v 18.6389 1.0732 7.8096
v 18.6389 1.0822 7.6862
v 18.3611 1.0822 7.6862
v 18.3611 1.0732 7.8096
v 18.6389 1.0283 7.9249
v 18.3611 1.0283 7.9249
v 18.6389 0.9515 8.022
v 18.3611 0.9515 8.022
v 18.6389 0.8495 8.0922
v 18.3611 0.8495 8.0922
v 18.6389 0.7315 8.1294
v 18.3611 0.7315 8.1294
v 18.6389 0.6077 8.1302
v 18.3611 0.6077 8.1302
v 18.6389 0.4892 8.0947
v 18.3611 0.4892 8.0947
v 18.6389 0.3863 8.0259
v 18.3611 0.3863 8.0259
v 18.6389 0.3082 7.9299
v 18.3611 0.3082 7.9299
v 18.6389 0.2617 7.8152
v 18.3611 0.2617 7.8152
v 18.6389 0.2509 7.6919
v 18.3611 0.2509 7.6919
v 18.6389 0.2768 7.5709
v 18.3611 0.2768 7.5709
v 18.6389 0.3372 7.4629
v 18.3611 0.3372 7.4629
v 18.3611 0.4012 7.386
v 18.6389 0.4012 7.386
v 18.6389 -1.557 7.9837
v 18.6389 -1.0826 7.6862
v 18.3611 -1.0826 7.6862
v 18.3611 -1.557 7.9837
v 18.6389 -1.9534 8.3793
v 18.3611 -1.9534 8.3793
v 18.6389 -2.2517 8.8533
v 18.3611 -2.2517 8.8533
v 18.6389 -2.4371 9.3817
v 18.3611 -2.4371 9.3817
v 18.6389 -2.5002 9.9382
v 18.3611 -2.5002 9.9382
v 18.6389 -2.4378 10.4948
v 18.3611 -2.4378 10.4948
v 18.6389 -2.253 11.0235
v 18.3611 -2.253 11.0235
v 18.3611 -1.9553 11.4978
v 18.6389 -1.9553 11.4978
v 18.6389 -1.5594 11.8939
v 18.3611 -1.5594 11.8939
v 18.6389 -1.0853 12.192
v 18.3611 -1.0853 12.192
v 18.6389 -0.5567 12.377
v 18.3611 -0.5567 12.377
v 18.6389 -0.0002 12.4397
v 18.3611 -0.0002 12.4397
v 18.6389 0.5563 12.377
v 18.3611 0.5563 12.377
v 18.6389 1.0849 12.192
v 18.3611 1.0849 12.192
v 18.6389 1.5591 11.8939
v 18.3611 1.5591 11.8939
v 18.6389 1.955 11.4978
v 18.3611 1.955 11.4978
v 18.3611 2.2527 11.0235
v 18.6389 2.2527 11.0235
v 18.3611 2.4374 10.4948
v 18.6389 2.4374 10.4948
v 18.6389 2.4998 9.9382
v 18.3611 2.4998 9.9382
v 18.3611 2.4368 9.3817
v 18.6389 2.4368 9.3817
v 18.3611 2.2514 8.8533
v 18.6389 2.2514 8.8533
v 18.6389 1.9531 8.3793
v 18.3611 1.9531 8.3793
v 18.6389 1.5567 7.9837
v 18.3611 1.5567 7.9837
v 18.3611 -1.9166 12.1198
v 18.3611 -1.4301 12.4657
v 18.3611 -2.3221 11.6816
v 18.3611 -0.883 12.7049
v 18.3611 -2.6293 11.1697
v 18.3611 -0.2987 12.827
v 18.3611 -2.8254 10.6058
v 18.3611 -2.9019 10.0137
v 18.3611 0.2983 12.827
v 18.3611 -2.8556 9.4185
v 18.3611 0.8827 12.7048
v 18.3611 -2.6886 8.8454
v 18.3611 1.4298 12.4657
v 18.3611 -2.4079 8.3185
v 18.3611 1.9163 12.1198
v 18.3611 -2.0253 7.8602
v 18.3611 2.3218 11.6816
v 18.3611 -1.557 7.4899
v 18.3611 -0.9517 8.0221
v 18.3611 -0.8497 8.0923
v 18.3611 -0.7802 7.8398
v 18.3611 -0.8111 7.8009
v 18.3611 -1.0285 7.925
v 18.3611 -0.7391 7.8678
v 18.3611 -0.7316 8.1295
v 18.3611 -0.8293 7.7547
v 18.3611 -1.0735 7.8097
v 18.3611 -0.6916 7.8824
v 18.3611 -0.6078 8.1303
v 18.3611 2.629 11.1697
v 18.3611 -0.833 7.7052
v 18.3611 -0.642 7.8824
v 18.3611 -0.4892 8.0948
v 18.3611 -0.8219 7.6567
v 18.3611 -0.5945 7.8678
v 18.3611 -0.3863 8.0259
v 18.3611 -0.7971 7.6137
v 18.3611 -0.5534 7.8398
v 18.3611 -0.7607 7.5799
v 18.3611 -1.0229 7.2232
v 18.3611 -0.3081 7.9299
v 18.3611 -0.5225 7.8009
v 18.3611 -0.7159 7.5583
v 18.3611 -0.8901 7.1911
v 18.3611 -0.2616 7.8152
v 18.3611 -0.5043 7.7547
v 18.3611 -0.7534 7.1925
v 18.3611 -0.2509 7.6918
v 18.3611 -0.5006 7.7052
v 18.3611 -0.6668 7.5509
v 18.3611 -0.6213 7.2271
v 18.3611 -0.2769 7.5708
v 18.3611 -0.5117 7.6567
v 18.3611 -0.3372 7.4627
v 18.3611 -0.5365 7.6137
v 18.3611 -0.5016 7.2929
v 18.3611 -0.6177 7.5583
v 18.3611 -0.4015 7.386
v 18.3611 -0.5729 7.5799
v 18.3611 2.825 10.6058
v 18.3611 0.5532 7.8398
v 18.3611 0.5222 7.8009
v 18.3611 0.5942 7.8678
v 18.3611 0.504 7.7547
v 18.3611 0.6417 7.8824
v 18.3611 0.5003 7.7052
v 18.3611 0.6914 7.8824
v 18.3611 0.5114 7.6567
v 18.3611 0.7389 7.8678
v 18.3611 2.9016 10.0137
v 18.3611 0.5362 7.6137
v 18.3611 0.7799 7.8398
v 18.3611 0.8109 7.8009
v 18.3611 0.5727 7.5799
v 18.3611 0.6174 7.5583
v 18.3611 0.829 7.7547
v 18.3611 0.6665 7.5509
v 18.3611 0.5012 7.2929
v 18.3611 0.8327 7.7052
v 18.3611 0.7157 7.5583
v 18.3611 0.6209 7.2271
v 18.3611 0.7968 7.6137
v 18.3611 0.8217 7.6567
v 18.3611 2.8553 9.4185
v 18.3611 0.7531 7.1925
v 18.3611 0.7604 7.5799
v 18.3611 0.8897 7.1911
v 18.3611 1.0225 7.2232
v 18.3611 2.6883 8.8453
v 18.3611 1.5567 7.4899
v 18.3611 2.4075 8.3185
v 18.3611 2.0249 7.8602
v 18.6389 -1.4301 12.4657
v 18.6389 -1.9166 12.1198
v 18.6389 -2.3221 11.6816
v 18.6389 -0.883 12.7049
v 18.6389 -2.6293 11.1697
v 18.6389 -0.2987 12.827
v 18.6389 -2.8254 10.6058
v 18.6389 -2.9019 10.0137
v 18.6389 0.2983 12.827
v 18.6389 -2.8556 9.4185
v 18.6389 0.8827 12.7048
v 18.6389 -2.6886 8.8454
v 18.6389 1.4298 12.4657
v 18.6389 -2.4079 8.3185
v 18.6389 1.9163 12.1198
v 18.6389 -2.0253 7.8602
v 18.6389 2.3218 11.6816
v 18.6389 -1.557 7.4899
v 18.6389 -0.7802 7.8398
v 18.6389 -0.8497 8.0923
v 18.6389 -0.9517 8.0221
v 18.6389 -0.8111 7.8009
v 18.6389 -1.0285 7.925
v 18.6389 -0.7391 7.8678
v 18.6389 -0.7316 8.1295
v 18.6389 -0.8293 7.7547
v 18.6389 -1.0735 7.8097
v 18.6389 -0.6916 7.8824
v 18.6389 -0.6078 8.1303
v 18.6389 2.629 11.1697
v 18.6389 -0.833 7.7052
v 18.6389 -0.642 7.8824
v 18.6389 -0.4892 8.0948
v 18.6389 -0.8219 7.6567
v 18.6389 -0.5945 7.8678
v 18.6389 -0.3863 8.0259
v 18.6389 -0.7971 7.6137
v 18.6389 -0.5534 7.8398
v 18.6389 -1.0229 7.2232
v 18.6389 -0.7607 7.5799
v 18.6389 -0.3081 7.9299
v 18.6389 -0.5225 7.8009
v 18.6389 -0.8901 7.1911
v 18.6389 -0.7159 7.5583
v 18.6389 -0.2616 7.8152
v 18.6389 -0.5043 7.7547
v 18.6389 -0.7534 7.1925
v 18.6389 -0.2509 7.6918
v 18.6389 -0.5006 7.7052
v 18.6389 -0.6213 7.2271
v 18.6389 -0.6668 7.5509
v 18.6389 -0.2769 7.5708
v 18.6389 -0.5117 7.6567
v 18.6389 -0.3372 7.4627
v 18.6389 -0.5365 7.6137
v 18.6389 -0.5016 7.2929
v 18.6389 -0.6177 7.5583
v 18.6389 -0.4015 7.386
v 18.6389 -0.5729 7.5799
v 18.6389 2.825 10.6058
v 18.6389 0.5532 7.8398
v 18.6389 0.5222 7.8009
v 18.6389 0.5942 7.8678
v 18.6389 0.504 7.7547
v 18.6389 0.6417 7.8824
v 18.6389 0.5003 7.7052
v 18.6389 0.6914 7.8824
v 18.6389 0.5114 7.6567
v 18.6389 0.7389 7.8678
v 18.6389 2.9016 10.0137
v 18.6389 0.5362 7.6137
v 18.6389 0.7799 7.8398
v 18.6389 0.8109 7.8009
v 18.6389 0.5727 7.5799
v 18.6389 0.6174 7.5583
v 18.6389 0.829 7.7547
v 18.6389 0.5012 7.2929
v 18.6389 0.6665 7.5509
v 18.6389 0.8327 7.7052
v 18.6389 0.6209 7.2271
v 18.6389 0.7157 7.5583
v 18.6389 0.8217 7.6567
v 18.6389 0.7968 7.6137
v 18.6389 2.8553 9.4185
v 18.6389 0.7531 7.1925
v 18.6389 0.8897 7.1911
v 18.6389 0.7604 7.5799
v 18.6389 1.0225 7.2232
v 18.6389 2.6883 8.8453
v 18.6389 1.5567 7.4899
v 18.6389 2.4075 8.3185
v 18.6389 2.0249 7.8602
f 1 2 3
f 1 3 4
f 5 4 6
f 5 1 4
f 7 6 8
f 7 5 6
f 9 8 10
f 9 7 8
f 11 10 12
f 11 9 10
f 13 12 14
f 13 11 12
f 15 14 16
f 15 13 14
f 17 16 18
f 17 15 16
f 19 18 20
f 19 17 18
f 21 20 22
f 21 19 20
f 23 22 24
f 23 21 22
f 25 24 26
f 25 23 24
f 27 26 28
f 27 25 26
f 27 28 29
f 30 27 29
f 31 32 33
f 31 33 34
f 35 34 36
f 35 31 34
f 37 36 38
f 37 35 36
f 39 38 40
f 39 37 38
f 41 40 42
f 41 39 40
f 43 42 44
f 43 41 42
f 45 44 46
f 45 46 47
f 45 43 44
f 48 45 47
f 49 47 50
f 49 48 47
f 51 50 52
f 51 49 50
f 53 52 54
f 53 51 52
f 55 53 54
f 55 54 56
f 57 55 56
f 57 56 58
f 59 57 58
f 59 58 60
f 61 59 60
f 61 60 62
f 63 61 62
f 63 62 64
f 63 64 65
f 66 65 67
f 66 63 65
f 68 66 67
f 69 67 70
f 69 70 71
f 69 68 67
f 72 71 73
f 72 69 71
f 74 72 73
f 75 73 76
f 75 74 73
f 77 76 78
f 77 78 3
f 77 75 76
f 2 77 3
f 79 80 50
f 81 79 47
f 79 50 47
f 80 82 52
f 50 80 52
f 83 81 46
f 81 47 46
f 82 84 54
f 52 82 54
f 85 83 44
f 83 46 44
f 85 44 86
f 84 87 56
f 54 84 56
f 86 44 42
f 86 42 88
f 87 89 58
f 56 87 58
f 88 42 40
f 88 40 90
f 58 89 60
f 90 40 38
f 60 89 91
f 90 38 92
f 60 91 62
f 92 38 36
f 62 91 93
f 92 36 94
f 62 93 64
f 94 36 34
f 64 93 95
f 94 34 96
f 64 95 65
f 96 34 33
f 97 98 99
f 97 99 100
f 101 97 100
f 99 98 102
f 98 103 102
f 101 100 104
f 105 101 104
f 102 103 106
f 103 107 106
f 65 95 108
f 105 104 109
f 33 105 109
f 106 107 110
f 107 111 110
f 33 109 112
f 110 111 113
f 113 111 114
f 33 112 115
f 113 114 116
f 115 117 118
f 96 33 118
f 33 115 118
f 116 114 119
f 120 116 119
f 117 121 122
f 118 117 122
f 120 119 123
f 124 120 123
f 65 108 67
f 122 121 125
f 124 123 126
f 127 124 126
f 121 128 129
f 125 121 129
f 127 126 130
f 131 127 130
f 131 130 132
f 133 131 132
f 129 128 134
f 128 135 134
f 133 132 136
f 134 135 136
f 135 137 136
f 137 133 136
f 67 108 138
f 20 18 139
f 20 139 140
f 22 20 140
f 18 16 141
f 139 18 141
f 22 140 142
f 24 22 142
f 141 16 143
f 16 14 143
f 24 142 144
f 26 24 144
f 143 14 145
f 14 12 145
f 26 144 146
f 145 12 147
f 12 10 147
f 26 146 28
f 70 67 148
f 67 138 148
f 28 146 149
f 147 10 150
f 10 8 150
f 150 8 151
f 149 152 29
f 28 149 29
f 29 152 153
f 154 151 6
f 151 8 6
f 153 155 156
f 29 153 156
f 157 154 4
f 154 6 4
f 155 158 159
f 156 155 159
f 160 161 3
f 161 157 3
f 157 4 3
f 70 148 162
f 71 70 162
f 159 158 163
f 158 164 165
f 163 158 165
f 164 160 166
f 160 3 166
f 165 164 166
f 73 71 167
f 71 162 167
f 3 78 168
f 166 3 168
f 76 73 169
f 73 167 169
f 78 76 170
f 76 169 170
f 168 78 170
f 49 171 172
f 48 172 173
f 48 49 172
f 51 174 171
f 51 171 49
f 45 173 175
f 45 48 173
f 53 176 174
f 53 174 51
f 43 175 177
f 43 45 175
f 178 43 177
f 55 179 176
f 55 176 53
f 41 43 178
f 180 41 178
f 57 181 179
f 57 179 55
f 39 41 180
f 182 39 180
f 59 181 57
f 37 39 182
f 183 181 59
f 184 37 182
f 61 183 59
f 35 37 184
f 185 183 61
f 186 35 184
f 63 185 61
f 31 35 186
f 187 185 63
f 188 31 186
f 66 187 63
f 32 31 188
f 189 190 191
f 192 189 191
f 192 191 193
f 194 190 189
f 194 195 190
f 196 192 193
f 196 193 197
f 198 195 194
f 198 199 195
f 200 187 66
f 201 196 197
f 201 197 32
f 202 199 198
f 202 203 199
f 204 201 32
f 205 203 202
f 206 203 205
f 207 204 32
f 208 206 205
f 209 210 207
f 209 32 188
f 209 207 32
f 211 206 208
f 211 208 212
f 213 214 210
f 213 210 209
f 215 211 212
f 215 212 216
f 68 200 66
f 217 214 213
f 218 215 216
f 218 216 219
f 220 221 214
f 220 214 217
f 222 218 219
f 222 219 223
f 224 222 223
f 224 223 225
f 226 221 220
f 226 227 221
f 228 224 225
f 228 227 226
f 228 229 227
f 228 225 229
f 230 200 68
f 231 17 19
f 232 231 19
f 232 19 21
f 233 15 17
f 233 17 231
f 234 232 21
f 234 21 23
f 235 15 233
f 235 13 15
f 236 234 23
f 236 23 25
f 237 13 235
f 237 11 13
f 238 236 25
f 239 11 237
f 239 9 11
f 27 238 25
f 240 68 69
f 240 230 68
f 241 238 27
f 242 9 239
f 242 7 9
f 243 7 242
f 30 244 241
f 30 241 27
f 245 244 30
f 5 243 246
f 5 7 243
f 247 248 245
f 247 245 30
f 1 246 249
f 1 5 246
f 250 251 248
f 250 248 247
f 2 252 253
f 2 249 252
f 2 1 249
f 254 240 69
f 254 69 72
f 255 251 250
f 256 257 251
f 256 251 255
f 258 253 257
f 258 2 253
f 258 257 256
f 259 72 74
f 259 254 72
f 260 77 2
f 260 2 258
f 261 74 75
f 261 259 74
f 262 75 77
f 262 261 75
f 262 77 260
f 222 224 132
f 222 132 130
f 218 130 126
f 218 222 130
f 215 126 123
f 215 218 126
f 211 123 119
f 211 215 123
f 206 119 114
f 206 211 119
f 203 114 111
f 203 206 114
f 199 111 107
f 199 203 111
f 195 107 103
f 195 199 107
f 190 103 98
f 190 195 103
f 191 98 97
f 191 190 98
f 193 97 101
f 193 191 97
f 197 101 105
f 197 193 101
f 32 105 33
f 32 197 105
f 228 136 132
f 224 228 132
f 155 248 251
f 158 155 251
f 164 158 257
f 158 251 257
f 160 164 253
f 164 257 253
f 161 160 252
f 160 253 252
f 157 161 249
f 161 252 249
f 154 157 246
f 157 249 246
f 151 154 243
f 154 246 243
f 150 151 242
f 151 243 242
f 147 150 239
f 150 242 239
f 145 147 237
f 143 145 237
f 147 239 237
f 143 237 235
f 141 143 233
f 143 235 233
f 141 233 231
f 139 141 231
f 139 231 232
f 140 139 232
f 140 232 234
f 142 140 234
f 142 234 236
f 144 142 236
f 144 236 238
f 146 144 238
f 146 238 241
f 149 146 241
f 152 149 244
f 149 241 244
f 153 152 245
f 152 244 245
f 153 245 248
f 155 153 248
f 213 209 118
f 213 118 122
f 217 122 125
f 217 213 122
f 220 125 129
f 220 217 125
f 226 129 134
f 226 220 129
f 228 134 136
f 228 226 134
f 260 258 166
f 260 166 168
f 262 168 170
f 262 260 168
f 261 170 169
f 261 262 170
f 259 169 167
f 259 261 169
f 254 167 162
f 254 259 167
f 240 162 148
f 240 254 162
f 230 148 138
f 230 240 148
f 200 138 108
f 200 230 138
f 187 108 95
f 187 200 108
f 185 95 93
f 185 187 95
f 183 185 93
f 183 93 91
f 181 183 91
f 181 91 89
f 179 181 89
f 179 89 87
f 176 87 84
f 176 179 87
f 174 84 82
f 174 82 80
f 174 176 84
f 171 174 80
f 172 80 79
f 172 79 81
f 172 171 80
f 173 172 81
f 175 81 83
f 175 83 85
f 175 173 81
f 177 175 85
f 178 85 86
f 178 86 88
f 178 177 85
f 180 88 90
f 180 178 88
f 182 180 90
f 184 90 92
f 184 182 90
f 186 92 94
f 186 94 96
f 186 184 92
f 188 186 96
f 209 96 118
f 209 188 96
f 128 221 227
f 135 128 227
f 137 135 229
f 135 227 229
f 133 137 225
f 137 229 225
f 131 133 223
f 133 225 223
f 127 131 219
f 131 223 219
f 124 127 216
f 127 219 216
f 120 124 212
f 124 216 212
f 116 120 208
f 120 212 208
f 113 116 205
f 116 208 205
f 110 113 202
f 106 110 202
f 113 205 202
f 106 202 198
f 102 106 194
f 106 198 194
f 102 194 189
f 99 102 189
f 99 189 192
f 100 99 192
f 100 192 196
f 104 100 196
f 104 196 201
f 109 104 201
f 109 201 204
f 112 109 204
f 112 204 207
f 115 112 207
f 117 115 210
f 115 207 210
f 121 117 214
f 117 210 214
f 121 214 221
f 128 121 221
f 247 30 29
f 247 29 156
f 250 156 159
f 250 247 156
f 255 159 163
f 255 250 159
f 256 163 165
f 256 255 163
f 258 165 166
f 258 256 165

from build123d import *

# Parameters (mm, degrees)
SKETCH1_R           = 0.6
BOSS_EXTRUDE1_DEPTH = 1
SCALE1_SCALE        = 0.222222222
SCALE2_SCALE        = 1.25


with BuildPart() as part:
    # Sketch1 → Boss-Extrude1 (new body)
    with BuildSketch(Plane(origin=(19, 0, 0), x_dir=(0, 0, -1), z_dir=(1, 0, 0))):
        with BuildLine():
            Line((-1.082906578, 1.214226965), (-0.806260325, 1.444819657))
            ThreePointArc((-0.806260325, 1.444819657), (-0.157167996, 2.46989624), (-0.220083072, 3.681566388))
            ThreePointArc((-0.220083072, 3.681566388), (-20.449170804, -0.000103807), (-0.220095755, -3.681843689))
            ThreePointArc((-0.220095755, -3.681843689), (-0.157177378, -2.470170425), (-0.806270581, -1.44509051))
            Line((-0.806270581, -1.44509051), (-1.082193901, -1.213563353))
            ThreePointArc((-1.082193901, -1.213563353), (-3.437745717, -1.969386585), (-1.886859109, -3.896727719))
            ThreePointArc((-1.886859109, -3.896727719), (-18.999593972, -0.000121806), (-1.886859109, 3.896484108))
            ThreePointArc((-1.886859109, 3.896484108), (-3.437385157, 1.97013231), (-1.082906578, 1.214226965))
        make_face()
        with Locations((-2.00000003, -2.4)):
            Circle(SKETCH1_R, mode=Mode.SUBTRACT)
        with Locations((-2.00000003, 2.4)):
            Circle(SKETCH1_R, mode=Mode.SUBTRACT)
    extrude(amount=-BOSS_EXTRUDE1_DEPTH)


with BuildPart() as part_1:
    # Scale1: scaled about (18.5, -0.000178585, 9.916688181)
    add(part.part.scale(SCALE1_SCALE).moved(Location((14.388888889, -0.000138899, 7.712979696))))


with BuildPart() as part_2:
    # Scale2: scaled about (18.5, -0.000178585, 9.916688181)
    add(part_1.part.scale(SCALE2_SCALE).moved(Location((-4.625, 4.4646e-05, -2.479172045))))


solid = part_2.part
